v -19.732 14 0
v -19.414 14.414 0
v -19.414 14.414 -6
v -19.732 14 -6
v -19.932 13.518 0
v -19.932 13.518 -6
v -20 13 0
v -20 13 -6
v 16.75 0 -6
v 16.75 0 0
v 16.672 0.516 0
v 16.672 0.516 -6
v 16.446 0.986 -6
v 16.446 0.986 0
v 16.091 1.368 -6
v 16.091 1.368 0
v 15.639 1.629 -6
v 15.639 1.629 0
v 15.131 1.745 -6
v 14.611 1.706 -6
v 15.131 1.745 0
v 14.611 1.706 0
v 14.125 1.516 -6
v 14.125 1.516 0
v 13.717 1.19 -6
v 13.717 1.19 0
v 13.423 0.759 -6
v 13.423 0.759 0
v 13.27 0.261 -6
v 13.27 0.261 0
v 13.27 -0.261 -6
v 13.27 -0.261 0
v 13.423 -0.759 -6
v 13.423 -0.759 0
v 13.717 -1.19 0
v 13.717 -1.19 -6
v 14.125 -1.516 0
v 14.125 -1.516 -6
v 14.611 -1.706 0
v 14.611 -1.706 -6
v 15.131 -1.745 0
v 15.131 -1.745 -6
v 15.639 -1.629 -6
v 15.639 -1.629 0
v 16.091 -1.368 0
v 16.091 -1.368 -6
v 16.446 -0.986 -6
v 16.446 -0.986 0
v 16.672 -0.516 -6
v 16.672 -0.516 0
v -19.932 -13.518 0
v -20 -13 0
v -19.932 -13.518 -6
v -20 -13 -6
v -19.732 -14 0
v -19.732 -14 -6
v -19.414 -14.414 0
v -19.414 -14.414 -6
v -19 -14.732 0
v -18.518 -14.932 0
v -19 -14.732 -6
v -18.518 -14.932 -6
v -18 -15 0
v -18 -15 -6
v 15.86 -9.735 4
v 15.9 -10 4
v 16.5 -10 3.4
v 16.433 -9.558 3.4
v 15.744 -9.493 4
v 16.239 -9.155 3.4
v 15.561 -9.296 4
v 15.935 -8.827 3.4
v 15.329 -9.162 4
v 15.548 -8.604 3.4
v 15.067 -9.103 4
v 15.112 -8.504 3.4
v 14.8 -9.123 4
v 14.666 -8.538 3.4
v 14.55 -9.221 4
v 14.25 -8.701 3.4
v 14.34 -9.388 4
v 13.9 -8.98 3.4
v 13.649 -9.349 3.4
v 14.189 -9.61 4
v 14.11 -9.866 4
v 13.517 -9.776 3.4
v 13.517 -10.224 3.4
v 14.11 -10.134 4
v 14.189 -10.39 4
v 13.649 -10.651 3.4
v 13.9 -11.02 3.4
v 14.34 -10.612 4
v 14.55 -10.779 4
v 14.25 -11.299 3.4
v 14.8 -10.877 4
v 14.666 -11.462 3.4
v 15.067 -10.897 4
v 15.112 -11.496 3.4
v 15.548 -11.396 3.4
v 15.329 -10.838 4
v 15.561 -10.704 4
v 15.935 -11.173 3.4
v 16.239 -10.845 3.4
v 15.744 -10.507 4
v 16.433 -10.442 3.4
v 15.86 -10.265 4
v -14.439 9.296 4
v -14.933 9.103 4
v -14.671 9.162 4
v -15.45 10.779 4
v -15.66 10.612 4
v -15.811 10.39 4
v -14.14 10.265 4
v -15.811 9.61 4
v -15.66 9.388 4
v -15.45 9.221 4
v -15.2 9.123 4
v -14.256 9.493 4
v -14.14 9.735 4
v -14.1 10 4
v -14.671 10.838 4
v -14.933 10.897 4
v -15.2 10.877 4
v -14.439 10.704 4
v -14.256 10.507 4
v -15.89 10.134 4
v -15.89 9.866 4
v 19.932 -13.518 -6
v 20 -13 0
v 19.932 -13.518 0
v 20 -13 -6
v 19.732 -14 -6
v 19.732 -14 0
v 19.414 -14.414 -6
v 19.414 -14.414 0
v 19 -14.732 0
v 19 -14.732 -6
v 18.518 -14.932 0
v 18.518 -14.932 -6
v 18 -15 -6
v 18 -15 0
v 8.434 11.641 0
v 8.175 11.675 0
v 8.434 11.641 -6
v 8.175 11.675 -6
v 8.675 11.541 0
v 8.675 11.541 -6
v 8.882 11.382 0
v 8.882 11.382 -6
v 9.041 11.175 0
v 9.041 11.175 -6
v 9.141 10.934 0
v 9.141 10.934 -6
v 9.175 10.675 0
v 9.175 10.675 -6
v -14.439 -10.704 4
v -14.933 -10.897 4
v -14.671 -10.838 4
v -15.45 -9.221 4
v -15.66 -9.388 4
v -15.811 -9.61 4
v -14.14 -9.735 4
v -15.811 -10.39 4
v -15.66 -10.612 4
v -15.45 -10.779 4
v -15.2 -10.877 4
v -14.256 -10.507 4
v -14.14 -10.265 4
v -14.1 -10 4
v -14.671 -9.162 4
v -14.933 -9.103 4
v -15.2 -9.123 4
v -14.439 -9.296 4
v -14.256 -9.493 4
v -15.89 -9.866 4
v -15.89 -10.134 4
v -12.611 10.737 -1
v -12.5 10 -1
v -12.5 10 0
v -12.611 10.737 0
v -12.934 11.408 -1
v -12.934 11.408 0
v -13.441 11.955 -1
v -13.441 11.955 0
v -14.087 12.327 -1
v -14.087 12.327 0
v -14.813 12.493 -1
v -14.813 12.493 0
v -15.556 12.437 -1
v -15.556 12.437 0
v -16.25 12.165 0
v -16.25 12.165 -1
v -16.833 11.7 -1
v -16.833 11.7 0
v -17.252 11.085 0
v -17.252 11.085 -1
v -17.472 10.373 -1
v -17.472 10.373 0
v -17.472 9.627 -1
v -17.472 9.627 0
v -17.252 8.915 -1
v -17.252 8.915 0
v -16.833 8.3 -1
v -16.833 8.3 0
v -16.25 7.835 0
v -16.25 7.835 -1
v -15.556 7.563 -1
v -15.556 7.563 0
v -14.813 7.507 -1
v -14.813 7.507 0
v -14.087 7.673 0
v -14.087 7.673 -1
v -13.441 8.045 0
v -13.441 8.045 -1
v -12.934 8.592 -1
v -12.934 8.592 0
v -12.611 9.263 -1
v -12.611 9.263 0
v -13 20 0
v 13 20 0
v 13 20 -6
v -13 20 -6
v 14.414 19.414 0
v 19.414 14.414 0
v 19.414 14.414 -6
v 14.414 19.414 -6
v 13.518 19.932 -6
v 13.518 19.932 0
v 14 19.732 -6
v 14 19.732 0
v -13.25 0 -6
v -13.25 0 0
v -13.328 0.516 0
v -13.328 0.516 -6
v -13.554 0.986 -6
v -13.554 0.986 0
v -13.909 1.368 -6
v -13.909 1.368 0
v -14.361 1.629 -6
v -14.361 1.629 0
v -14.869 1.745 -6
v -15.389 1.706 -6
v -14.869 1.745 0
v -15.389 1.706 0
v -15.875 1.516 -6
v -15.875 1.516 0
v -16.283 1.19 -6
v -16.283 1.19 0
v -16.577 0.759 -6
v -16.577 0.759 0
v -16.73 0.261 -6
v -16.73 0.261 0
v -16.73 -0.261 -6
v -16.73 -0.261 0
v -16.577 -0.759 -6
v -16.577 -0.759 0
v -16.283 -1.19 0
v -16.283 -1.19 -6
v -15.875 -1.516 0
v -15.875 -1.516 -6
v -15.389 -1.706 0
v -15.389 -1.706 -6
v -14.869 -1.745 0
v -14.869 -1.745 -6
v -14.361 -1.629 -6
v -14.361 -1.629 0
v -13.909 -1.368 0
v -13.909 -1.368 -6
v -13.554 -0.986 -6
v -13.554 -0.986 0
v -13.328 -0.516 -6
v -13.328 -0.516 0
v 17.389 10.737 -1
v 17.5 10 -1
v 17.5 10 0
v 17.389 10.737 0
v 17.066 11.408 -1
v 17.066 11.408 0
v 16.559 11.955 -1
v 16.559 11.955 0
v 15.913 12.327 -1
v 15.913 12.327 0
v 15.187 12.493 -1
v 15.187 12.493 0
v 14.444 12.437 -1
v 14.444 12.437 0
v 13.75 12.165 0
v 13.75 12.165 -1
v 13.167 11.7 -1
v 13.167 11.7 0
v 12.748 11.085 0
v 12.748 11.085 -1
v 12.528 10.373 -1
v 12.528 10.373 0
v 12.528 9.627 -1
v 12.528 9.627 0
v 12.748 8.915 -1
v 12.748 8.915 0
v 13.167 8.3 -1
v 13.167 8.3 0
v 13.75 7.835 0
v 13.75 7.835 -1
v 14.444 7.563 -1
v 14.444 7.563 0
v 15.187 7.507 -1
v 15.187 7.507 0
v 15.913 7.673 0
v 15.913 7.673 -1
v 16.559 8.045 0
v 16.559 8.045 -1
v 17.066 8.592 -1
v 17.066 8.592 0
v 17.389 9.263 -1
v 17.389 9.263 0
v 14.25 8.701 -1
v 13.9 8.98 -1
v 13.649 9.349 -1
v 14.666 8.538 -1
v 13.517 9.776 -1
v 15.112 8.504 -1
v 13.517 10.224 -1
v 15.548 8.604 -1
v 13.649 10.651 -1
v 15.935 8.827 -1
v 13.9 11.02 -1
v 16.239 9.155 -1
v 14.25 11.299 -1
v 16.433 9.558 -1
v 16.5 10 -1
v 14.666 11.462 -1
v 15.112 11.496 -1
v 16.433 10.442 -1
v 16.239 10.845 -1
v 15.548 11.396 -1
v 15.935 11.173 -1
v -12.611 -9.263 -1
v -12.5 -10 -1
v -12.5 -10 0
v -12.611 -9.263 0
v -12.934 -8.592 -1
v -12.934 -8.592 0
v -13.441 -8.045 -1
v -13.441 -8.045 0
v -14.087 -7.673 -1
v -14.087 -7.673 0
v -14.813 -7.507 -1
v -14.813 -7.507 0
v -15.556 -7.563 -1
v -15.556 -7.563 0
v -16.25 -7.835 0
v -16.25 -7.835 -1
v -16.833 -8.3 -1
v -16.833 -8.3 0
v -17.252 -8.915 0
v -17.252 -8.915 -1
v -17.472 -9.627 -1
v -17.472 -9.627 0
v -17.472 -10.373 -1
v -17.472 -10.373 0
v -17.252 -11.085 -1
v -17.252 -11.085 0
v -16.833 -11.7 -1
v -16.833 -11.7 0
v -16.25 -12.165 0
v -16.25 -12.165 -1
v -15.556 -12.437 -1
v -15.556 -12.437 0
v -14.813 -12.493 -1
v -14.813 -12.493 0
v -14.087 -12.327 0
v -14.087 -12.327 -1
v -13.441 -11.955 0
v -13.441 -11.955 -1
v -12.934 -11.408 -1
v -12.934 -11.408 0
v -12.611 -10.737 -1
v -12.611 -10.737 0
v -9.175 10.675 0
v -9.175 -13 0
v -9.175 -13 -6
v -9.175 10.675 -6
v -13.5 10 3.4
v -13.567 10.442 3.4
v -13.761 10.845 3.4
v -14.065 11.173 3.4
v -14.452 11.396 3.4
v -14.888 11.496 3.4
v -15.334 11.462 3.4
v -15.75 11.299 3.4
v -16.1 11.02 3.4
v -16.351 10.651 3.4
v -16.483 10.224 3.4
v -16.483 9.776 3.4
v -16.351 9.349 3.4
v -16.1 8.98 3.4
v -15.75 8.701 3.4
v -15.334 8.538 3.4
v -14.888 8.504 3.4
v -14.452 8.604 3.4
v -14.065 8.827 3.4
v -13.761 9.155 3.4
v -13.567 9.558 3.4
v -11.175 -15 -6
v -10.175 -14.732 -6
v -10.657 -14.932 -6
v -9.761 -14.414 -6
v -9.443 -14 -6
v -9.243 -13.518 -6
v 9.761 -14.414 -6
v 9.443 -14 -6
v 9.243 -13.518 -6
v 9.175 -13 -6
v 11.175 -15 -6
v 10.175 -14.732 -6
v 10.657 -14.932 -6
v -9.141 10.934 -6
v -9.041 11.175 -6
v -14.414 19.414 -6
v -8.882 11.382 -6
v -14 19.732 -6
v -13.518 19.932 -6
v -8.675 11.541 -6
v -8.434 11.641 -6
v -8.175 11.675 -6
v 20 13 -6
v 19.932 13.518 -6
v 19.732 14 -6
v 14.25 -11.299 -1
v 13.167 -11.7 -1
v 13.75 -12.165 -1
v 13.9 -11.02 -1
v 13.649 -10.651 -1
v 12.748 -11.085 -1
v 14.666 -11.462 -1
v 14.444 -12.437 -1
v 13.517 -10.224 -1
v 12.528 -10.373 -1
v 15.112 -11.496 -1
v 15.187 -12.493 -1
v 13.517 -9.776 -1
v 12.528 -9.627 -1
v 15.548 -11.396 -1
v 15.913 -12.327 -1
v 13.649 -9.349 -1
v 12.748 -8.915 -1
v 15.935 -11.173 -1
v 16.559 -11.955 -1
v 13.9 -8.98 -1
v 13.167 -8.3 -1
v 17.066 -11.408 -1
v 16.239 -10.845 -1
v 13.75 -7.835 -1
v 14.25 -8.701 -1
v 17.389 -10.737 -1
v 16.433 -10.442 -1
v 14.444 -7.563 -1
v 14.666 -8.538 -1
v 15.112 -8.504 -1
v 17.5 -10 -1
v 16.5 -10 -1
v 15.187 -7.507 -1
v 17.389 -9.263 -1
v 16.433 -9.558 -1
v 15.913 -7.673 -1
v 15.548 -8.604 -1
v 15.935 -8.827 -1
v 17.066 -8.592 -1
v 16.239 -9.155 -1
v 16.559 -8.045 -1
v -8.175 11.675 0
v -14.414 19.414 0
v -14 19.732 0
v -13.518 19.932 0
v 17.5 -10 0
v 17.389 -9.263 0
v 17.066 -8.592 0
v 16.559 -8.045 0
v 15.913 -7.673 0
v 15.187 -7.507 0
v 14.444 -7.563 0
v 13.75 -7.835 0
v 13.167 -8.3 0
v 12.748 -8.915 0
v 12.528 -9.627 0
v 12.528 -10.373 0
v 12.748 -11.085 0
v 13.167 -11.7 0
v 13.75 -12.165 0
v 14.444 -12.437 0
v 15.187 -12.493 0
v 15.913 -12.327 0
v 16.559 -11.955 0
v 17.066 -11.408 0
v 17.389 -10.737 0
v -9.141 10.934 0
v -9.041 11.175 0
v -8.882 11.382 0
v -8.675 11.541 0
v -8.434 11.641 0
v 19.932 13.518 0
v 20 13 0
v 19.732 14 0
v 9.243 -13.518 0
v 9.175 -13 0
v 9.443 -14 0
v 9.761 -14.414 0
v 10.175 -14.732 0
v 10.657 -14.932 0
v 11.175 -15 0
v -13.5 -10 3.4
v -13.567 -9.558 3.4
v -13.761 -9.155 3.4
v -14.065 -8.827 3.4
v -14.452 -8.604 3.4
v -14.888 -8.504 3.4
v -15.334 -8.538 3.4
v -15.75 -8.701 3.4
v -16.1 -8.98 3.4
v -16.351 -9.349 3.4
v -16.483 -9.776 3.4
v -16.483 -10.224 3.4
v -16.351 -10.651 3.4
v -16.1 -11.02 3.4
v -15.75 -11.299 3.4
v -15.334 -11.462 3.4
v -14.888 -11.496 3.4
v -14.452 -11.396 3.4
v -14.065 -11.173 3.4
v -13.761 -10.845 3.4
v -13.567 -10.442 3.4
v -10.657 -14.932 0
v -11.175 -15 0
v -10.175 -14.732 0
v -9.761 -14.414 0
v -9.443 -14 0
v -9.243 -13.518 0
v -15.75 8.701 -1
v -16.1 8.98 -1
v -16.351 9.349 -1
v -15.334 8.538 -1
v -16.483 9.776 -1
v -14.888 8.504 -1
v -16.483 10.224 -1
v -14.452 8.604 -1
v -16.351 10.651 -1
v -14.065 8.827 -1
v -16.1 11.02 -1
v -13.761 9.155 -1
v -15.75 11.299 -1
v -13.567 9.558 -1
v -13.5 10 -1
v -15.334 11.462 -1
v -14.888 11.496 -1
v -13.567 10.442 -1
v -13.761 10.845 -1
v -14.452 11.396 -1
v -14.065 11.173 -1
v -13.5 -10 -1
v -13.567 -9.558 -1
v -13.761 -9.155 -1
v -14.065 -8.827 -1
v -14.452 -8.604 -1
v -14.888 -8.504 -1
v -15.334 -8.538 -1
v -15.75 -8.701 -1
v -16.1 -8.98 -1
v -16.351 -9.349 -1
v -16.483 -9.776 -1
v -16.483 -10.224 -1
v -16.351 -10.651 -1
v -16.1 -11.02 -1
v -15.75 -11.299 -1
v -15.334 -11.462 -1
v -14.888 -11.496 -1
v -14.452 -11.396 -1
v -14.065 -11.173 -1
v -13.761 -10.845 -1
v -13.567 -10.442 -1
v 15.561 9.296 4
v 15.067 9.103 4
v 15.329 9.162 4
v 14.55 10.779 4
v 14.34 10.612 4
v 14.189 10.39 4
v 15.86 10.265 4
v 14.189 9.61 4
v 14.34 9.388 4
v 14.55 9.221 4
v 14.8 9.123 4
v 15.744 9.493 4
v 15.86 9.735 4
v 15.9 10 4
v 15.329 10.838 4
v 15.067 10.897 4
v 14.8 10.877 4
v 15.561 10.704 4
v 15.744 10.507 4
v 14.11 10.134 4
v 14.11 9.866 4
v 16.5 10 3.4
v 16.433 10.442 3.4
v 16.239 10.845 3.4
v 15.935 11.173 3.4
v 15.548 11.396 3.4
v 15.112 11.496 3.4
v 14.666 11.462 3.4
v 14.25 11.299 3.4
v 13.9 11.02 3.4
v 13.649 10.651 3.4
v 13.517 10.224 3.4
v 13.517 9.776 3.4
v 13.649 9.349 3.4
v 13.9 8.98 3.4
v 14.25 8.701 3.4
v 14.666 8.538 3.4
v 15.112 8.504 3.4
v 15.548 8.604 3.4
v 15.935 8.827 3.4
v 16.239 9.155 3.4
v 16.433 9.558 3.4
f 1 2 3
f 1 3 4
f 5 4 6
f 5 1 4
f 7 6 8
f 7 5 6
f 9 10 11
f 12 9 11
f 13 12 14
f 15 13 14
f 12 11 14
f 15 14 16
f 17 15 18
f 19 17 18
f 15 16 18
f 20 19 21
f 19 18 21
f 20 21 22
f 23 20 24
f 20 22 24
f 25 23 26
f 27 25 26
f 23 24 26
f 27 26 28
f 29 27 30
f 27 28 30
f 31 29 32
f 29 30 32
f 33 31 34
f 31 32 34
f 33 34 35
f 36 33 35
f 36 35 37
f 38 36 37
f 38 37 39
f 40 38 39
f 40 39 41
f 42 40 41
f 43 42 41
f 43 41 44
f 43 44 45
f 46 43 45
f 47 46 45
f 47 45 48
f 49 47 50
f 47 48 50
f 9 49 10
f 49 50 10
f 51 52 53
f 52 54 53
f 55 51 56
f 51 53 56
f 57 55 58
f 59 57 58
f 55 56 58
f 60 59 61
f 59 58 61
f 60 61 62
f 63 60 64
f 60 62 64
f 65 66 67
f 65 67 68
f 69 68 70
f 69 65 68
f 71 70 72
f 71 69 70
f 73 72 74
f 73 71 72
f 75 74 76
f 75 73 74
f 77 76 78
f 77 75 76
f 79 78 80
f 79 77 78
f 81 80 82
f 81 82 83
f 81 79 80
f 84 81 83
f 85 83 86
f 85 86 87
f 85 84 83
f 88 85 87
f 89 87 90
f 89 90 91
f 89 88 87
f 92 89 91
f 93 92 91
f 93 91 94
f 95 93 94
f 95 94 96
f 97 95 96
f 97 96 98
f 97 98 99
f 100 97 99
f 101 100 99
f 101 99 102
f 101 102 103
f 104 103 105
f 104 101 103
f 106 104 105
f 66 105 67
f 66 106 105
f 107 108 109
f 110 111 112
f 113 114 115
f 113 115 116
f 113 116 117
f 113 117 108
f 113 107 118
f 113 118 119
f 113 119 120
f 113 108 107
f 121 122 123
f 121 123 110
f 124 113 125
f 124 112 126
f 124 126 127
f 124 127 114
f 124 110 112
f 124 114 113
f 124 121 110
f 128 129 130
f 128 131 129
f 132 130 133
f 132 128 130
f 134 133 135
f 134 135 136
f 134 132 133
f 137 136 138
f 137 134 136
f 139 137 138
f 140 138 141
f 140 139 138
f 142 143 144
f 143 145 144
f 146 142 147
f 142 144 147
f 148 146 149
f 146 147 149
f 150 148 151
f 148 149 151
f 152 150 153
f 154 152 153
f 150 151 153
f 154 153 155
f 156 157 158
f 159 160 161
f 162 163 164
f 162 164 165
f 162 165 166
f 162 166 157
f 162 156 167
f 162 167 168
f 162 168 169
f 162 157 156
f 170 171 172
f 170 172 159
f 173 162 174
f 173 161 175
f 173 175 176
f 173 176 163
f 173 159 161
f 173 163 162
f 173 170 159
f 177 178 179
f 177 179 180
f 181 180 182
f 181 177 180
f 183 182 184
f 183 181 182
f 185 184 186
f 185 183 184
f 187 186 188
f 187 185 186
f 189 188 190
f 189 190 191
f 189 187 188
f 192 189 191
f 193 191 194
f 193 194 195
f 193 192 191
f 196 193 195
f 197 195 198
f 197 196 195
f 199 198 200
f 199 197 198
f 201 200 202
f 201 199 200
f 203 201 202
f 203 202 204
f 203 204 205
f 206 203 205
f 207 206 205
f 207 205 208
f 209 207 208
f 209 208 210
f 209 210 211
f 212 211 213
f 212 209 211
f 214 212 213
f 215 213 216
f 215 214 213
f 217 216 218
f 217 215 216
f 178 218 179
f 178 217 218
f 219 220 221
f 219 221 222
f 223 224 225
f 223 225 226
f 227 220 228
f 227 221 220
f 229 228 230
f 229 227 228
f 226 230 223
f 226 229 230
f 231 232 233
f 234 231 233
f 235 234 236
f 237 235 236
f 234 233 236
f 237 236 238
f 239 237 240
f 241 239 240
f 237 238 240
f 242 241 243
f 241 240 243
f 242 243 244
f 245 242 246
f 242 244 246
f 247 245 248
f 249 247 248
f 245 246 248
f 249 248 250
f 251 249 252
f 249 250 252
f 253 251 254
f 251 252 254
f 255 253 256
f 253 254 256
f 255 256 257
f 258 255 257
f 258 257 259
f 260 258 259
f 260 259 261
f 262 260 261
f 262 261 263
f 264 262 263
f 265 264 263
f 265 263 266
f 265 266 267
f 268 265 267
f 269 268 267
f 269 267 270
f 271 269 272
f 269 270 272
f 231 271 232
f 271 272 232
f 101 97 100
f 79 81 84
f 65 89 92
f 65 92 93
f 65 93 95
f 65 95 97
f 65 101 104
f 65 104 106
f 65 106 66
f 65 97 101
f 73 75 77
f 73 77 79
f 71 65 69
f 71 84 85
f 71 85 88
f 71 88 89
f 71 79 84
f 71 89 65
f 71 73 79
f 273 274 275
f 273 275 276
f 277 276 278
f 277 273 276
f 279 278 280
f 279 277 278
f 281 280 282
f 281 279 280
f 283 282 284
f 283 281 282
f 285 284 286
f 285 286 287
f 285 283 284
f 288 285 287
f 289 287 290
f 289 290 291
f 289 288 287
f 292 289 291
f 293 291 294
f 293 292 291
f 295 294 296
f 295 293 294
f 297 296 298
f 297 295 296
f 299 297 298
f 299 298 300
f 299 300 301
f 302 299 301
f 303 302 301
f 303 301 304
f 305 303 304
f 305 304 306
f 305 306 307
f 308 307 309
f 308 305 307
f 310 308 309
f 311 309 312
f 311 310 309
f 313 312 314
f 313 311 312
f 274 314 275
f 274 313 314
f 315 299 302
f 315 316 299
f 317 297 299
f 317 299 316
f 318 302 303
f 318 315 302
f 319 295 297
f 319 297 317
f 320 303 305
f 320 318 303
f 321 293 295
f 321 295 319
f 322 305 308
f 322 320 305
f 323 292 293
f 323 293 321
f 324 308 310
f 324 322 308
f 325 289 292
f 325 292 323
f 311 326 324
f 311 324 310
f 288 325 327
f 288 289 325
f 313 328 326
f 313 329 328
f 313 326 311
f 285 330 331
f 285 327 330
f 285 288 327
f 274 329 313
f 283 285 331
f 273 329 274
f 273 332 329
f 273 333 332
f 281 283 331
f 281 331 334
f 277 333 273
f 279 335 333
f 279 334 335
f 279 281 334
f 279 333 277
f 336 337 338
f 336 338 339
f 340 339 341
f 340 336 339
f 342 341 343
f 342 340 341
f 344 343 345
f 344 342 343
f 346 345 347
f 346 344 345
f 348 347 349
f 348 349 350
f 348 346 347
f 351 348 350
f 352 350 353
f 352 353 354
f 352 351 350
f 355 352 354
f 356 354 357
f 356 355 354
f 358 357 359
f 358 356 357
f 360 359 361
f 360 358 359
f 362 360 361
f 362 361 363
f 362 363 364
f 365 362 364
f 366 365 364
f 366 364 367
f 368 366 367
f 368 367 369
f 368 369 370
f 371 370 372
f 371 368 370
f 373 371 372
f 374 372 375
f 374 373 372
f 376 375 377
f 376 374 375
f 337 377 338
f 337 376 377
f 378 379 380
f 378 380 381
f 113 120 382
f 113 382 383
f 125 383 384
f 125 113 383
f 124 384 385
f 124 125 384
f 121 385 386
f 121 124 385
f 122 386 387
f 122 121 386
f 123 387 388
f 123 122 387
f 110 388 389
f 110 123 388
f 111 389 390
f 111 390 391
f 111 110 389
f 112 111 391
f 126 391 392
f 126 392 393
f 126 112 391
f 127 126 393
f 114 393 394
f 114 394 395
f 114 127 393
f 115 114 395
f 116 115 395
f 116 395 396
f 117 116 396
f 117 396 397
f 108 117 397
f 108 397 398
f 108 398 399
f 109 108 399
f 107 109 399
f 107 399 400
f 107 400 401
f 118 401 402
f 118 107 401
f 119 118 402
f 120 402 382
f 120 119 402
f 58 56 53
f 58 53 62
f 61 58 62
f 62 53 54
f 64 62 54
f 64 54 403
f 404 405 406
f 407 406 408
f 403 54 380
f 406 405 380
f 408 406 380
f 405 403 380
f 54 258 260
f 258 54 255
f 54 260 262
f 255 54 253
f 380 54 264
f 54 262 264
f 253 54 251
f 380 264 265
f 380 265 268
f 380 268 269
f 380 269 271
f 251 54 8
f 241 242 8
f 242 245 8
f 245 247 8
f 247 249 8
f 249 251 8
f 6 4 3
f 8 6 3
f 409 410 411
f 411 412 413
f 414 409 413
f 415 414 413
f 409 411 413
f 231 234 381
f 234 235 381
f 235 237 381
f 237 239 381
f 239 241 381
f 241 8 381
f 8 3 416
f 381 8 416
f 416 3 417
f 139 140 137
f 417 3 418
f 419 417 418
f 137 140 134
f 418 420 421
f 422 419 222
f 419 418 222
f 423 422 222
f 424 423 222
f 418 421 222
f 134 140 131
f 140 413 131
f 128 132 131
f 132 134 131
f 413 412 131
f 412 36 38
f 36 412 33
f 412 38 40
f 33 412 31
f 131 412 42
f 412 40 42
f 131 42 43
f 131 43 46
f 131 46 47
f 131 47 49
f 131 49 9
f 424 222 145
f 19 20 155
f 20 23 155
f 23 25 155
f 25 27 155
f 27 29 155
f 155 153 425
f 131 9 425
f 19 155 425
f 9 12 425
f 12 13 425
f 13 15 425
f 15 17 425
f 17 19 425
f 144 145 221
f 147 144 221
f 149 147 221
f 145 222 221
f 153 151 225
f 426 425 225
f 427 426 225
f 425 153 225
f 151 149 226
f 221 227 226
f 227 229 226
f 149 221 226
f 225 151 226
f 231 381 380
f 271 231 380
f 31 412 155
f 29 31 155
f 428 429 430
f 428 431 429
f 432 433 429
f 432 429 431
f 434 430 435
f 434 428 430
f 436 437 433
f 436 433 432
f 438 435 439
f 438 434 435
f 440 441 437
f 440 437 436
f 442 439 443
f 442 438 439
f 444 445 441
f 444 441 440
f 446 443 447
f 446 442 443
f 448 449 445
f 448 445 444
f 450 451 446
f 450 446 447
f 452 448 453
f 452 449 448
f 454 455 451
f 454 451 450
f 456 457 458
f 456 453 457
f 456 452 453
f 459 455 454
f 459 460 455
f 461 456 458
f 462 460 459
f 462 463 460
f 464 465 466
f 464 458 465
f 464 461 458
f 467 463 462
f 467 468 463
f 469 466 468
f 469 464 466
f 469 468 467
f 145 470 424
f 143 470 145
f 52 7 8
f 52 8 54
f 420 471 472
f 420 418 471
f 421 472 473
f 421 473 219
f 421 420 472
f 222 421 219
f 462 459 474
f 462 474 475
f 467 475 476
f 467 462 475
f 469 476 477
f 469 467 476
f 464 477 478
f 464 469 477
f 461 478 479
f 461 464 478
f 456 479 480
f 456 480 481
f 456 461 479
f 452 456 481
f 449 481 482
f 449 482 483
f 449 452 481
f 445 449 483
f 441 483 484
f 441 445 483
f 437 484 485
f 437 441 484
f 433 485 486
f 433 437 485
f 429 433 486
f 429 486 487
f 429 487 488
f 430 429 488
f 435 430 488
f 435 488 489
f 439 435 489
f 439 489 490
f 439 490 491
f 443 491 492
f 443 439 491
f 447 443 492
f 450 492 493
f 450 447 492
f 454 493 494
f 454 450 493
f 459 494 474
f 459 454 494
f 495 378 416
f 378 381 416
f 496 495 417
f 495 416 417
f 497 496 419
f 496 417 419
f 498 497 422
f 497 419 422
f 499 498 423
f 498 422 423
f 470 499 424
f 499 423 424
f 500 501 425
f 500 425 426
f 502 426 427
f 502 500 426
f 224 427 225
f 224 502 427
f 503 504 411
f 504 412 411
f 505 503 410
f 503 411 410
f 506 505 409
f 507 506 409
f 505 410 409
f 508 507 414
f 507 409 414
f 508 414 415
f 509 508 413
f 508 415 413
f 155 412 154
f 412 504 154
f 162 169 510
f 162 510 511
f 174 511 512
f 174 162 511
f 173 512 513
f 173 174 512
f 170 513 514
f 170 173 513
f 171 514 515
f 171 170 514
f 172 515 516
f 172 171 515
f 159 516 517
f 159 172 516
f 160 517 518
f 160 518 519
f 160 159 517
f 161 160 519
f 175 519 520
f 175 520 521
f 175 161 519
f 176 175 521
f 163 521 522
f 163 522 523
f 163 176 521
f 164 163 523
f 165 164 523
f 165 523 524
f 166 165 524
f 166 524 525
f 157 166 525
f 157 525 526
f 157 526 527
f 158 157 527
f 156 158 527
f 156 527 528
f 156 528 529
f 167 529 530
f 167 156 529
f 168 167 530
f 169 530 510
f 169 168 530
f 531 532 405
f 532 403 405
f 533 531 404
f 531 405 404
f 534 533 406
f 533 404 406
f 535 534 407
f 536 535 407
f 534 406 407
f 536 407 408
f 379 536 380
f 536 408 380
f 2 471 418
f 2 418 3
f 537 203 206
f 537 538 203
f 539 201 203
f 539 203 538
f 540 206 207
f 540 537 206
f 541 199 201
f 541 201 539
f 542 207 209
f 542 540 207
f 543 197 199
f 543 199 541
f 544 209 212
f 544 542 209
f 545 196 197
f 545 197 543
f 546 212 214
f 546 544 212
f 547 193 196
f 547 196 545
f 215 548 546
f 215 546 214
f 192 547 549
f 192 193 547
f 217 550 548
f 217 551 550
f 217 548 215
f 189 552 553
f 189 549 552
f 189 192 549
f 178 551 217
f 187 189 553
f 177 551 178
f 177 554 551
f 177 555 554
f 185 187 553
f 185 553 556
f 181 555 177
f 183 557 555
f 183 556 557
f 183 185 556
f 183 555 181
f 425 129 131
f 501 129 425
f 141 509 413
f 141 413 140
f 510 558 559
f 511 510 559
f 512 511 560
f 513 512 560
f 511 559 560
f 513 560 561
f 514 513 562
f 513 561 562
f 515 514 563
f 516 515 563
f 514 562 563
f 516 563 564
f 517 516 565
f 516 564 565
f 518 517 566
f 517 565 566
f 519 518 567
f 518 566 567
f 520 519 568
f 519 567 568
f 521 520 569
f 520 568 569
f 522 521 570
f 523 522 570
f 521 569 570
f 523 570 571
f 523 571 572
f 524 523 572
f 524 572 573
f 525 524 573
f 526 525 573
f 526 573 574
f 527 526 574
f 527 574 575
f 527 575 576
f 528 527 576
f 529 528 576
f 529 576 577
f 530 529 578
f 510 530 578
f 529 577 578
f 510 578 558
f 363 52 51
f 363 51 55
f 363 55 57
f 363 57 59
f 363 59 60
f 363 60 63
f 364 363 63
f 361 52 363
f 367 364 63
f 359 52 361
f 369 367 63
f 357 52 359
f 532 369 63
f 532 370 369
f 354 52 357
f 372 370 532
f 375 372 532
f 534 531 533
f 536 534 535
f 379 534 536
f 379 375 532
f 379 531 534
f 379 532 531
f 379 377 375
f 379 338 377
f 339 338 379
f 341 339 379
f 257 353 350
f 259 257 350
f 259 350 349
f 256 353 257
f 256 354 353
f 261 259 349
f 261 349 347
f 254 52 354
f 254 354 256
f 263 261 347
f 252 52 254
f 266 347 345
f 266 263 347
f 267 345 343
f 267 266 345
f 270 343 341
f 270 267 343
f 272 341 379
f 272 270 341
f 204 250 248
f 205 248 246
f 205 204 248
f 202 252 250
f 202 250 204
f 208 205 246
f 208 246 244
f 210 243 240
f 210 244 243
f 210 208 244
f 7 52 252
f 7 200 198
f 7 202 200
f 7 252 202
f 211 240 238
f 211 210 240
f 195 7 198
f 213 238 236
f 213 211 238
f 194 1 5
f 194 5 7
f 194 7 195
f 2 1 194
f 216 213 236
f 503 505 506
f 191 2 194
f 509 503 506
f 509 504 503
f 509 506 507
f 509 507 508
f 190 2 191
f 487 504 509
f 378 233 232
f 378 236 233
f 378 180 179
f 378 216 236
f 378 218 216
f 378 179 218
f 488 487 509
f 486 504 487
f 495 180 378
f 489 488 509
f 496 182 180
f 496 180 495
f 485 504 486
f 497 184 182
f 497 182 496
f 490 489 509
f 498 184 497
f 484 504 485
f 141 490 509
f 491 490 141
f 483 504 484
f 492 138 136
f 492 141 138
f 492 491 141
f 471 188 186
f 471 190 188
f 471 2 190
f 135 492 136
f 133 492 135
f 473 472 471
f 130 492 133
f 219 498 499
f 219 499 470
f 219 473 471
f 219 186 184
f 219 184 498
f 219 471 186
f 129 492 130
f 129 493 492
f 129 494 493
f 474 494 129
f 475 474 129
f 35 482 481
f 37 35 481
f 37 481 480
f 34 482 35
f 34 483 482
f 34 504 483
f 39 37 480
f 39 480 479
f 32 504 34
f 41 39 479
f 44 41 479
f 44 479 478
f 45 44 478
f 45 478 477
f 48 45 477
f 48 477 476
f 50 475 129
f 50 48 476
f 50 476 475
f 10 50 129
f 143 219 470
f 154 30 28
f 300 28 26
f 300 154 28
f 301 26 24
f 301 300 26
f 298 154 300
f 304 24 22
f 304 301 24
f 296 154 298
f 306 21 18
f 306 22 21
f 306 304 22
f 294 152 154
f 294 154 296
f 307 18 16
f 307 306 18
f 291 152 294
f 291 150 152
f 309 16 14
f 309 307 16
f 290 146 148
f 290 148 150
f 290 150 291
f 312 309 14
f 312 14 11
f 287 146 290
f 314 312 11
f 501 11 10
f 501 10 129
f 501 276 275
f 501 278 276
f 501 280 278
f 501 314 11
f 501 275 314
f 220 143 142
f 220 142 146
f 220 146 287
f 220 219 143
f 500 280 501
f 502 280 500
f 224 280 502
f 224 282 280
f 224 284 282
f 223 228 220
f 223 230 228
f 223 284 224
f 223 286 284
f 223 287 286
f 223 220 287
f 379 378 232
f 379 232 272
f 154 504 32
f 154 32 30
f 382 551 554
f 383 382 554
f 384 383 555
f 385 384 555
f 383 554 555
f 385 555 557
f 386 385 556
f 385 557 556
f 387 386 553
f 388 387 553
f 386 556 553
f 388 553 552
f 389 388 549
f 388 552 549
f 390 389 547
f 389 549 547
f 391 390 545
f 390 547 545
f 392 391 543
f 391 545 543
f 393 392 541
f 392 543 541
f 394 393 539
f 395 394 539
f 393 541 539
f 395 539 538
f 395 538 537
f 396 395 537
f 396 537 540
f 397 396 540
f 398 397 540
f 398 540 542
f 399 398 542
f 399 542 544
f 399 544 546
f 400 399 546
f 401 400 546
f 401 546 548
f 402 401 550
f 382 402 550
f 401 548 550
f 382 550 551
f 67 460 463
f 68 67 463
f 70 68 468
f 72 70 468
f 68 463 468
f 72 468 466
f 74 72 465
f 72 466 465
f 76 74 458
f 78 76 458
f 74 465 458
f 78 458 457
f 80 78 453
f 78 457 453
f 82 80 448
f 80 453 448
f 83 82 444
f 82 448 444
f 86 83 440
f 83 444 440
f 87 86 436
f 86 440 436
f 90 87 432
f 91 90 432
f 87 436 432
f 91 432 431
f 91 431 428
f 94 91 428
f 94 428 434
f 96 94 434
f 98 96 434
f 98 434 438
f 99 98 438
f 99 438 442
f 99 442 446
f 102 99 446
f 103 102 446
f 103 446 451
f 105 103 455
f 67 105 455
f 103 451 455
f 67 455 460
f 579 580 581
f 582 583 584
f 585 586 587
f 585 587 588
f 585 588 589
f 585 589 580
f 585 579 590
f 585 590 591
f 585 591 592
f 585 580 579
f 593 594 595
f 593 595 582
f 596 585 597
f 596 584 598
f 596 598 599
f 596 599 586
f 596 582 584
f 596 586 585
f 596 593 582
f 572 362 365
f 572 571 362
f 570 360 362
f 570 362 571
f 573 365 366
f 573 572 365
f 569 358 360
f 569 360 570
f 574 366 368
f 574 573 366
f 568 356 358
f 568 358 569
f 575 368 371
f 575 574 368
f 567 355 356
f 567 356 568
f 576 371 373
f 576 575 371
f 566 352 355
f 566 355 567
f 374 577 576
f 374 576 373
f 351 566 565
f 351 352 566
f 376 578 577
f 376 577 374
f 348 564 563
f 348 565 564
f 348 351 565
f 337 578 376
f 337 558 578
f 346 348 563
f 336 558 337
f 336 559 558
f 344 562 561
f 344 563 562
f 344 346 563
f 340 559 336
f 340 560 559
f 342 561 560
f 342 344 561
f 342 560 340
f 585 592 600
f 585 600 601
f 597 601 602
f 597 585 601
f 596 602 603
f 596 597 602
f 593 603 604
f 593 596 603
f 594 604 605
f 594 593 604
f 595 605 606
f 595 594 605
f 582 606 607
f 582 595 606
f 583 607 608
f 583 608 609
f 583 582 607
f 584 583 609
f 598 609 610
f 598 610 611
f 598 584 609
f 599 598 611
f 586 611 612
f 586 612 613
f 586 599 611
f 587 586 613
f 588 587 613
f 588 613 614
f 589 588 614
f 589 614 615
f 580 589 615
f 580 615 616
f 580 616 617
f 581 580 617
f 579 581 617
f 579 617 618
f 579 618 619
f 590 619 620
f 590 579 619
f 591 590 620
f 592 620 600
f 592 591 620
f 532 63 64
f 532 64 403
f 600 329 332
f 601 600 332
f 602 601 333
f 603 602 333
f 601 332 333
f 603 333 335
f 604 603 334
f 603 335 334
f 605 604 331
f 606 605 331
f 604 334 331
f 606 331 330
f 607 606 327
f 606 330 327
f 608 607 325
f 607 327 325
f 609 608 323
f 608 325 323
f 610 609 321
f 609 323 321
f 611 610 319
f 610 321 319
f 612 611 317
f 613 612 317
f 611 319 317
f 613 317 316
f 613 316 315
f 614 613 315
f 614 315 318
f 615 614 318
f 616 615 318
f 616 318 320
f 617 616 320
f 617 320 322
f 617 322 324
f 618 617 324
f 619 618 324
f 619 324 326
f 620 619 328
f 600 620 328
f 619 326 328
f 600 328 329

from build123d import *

# Parameters (mm, degrees)
SKICA2_R                 = 1.75
SKICA2_W                 = 18.35
SKICA2_H                 = 23.35
P_IDAT_VYSUNUT_M1_DEPTH  = 6
SKICA2_3_R               = 1.5
P_IDAT_VYSUNUT_M2_DEPTH  = 4
SKICA4_W                 = 18.35
SKICA4_H                 = 3.325
ODEBRAT_VYSUNUT_M2_DEPTH = 29.91366459
ODEBRAT_START            = -1
SKICA5_R                 = 2.5
SKICA5_R_2               = 1.5
ODEBRAT_VYSUNUT_M3_DEPTH = 1
ZKOSEN_1_SIZE            = 0.6
ZAOBLIT1_R               = 2
ZAOBLIT2_R               = 1


with BuildPart() as part:
    # Skica2 → P_idat vysunut_m1 (new body)
    with BuildSketch(Plane.XY):
        with BuildLine():
            Line((-20, 13), (-20, -15))
            Line((-20, -15), (20, -15))
            Line((20, -15), (20, 13))
            ThreePointArc((20, 13), (19.847759065, 13.765366865), (19.414213562, 14.414213562))
            Line((19.414213562, 14.414213562), (13.828427125, 20))
            Line((13.828427125, 20), (-13.828427125, 20))
            Line((-13.828427125, 20), (-19.414213562, 14.414213562))
            ThreePointArc((-19.414213562, 14.414213562), (-19.847759065, 13.765366865), (-20, 13))
        make_face()
        with Locations((-15, 0)):
            Circle(SKICA2_R, mode=Mode.SUBTRACT)
        with Locations((15, 0)):
            Circle(SKICA2_R, mode=Mode.SUBTRACT)
        Rectangle(SKICA2_W, SKICA2_H, mode=Mode.SUBTRACT)
    extrude(amount=-P_IDAT_VYSUNUT_M1_DEPTH)

    # Skica2_3 → P_idat vysunut_m2 (add)
    with BuildSketch(Plane.XY):
        with Locations((-15, -10)):
            Circle(SKICA2_3_R)
        with Locations((15, -10)):
            Circle(SKICA2_3_R)
        with Locations((15, 10)):
            Circle(SKICA2_3_R)
        with Locations((-15, 10)):
            Circle(SKICA2_3_R)
    extrude(amount=P_IDAT_VYSUNUT_M2_DEPTH)

    # Skica4 → Odebrat vysunut_m2 (cut, through all)
    with BuildSketch(Plane.XY):
        with Locations((0, -13.3375)):
            Rectangle(SKICA4_W, SKICA4_H)
    extrude(amount=-ODEBRAT_VYSUNUT_M2_DEPTH, mode=Mode.SUBTRACT)

    # Skica5 → Odebrat vysunut_m3 (cut)
    # profile 1 of 4: a face of its own
    with BuildSketch(Plane.XY.offset(ODEBRAT_START)):
        with Locations((-15, 10)):
            Circle(SKICA5_R)
        with Locations((-15, 10)):
            Circle(SKICA5_R_2, mode=Mode.SUBTRACT)
    # profile 2 of 4: a face of its own
    with BuildSketch(Plane.XY.offset(ODEBRAT_START)):
        with Locations((-15, -10)):
            Circle(SKICA5_R)
        with Locations((-15, -10)):
            Circle(SKICA5_R_2, mode=Mode.SUBTRACT)
    # profile 3 of 4: a face of its own
    with BuildSketch(Plane.XY.offset(ODEBRAT_START)):
        with Locations((15, -10)):
            Circle(SKICA5_R)
        with Locations((15, -10)):
            Circle(SKICA5_R_2, mode=Mode.SUBTRACT)
    # profile 4 of 4: a face of its own
    with BuildSketch(Plane.XY.offset(ODEBRAT_START)):
        with Locations((15, 10)):
            Circle(SKICA5_R)
        with Locations((15, 10)):
            Circle(SKICA5_R_2, mode=Mode.SUBTRACT)
    extrude(amount=ODEBRAT_VYSUNUT_M3_DEPTH, mode=Mode.SUBTRACT)

    # Zkosen_1
    zkosen_1_edges = [part.edges().sort_by_distance(p)[0] for p in [
        (-16.5, 10, 4),
        (13.5, 10, 4),
        (13.5, -10, 4),
        (-16.5, -10, 4),
    ]]
    chamfer(zkosen_1_edges, length=ZKOSEN_1_SIZE)

    # Zaoblit1
    zaoblit1_edges = [part.edges().sort_by_distance(p)[0] for p in [
        (-13.828427125, 20, -3),
        (13.828427125, 20, -3),
        (20, -15, -3),
        (-20, -15, -3),
        (9.175, -15, -3),
        (-9.175, -15, -3),
    ]]
    fillet(zaoblit1_edges, radius=ZAOBLIT1_R)

    # Zaoblit2
    zaoblit2_edges = [part.edges().sort_by_distance(p)[0] for p in [
        (-9.175, 11.675, -3),
        (9.175, 11.675, -3),
    ]]
    fillet(zaoblit2_edges, radius=ZAOBLIT2_R)


solid = part.part
